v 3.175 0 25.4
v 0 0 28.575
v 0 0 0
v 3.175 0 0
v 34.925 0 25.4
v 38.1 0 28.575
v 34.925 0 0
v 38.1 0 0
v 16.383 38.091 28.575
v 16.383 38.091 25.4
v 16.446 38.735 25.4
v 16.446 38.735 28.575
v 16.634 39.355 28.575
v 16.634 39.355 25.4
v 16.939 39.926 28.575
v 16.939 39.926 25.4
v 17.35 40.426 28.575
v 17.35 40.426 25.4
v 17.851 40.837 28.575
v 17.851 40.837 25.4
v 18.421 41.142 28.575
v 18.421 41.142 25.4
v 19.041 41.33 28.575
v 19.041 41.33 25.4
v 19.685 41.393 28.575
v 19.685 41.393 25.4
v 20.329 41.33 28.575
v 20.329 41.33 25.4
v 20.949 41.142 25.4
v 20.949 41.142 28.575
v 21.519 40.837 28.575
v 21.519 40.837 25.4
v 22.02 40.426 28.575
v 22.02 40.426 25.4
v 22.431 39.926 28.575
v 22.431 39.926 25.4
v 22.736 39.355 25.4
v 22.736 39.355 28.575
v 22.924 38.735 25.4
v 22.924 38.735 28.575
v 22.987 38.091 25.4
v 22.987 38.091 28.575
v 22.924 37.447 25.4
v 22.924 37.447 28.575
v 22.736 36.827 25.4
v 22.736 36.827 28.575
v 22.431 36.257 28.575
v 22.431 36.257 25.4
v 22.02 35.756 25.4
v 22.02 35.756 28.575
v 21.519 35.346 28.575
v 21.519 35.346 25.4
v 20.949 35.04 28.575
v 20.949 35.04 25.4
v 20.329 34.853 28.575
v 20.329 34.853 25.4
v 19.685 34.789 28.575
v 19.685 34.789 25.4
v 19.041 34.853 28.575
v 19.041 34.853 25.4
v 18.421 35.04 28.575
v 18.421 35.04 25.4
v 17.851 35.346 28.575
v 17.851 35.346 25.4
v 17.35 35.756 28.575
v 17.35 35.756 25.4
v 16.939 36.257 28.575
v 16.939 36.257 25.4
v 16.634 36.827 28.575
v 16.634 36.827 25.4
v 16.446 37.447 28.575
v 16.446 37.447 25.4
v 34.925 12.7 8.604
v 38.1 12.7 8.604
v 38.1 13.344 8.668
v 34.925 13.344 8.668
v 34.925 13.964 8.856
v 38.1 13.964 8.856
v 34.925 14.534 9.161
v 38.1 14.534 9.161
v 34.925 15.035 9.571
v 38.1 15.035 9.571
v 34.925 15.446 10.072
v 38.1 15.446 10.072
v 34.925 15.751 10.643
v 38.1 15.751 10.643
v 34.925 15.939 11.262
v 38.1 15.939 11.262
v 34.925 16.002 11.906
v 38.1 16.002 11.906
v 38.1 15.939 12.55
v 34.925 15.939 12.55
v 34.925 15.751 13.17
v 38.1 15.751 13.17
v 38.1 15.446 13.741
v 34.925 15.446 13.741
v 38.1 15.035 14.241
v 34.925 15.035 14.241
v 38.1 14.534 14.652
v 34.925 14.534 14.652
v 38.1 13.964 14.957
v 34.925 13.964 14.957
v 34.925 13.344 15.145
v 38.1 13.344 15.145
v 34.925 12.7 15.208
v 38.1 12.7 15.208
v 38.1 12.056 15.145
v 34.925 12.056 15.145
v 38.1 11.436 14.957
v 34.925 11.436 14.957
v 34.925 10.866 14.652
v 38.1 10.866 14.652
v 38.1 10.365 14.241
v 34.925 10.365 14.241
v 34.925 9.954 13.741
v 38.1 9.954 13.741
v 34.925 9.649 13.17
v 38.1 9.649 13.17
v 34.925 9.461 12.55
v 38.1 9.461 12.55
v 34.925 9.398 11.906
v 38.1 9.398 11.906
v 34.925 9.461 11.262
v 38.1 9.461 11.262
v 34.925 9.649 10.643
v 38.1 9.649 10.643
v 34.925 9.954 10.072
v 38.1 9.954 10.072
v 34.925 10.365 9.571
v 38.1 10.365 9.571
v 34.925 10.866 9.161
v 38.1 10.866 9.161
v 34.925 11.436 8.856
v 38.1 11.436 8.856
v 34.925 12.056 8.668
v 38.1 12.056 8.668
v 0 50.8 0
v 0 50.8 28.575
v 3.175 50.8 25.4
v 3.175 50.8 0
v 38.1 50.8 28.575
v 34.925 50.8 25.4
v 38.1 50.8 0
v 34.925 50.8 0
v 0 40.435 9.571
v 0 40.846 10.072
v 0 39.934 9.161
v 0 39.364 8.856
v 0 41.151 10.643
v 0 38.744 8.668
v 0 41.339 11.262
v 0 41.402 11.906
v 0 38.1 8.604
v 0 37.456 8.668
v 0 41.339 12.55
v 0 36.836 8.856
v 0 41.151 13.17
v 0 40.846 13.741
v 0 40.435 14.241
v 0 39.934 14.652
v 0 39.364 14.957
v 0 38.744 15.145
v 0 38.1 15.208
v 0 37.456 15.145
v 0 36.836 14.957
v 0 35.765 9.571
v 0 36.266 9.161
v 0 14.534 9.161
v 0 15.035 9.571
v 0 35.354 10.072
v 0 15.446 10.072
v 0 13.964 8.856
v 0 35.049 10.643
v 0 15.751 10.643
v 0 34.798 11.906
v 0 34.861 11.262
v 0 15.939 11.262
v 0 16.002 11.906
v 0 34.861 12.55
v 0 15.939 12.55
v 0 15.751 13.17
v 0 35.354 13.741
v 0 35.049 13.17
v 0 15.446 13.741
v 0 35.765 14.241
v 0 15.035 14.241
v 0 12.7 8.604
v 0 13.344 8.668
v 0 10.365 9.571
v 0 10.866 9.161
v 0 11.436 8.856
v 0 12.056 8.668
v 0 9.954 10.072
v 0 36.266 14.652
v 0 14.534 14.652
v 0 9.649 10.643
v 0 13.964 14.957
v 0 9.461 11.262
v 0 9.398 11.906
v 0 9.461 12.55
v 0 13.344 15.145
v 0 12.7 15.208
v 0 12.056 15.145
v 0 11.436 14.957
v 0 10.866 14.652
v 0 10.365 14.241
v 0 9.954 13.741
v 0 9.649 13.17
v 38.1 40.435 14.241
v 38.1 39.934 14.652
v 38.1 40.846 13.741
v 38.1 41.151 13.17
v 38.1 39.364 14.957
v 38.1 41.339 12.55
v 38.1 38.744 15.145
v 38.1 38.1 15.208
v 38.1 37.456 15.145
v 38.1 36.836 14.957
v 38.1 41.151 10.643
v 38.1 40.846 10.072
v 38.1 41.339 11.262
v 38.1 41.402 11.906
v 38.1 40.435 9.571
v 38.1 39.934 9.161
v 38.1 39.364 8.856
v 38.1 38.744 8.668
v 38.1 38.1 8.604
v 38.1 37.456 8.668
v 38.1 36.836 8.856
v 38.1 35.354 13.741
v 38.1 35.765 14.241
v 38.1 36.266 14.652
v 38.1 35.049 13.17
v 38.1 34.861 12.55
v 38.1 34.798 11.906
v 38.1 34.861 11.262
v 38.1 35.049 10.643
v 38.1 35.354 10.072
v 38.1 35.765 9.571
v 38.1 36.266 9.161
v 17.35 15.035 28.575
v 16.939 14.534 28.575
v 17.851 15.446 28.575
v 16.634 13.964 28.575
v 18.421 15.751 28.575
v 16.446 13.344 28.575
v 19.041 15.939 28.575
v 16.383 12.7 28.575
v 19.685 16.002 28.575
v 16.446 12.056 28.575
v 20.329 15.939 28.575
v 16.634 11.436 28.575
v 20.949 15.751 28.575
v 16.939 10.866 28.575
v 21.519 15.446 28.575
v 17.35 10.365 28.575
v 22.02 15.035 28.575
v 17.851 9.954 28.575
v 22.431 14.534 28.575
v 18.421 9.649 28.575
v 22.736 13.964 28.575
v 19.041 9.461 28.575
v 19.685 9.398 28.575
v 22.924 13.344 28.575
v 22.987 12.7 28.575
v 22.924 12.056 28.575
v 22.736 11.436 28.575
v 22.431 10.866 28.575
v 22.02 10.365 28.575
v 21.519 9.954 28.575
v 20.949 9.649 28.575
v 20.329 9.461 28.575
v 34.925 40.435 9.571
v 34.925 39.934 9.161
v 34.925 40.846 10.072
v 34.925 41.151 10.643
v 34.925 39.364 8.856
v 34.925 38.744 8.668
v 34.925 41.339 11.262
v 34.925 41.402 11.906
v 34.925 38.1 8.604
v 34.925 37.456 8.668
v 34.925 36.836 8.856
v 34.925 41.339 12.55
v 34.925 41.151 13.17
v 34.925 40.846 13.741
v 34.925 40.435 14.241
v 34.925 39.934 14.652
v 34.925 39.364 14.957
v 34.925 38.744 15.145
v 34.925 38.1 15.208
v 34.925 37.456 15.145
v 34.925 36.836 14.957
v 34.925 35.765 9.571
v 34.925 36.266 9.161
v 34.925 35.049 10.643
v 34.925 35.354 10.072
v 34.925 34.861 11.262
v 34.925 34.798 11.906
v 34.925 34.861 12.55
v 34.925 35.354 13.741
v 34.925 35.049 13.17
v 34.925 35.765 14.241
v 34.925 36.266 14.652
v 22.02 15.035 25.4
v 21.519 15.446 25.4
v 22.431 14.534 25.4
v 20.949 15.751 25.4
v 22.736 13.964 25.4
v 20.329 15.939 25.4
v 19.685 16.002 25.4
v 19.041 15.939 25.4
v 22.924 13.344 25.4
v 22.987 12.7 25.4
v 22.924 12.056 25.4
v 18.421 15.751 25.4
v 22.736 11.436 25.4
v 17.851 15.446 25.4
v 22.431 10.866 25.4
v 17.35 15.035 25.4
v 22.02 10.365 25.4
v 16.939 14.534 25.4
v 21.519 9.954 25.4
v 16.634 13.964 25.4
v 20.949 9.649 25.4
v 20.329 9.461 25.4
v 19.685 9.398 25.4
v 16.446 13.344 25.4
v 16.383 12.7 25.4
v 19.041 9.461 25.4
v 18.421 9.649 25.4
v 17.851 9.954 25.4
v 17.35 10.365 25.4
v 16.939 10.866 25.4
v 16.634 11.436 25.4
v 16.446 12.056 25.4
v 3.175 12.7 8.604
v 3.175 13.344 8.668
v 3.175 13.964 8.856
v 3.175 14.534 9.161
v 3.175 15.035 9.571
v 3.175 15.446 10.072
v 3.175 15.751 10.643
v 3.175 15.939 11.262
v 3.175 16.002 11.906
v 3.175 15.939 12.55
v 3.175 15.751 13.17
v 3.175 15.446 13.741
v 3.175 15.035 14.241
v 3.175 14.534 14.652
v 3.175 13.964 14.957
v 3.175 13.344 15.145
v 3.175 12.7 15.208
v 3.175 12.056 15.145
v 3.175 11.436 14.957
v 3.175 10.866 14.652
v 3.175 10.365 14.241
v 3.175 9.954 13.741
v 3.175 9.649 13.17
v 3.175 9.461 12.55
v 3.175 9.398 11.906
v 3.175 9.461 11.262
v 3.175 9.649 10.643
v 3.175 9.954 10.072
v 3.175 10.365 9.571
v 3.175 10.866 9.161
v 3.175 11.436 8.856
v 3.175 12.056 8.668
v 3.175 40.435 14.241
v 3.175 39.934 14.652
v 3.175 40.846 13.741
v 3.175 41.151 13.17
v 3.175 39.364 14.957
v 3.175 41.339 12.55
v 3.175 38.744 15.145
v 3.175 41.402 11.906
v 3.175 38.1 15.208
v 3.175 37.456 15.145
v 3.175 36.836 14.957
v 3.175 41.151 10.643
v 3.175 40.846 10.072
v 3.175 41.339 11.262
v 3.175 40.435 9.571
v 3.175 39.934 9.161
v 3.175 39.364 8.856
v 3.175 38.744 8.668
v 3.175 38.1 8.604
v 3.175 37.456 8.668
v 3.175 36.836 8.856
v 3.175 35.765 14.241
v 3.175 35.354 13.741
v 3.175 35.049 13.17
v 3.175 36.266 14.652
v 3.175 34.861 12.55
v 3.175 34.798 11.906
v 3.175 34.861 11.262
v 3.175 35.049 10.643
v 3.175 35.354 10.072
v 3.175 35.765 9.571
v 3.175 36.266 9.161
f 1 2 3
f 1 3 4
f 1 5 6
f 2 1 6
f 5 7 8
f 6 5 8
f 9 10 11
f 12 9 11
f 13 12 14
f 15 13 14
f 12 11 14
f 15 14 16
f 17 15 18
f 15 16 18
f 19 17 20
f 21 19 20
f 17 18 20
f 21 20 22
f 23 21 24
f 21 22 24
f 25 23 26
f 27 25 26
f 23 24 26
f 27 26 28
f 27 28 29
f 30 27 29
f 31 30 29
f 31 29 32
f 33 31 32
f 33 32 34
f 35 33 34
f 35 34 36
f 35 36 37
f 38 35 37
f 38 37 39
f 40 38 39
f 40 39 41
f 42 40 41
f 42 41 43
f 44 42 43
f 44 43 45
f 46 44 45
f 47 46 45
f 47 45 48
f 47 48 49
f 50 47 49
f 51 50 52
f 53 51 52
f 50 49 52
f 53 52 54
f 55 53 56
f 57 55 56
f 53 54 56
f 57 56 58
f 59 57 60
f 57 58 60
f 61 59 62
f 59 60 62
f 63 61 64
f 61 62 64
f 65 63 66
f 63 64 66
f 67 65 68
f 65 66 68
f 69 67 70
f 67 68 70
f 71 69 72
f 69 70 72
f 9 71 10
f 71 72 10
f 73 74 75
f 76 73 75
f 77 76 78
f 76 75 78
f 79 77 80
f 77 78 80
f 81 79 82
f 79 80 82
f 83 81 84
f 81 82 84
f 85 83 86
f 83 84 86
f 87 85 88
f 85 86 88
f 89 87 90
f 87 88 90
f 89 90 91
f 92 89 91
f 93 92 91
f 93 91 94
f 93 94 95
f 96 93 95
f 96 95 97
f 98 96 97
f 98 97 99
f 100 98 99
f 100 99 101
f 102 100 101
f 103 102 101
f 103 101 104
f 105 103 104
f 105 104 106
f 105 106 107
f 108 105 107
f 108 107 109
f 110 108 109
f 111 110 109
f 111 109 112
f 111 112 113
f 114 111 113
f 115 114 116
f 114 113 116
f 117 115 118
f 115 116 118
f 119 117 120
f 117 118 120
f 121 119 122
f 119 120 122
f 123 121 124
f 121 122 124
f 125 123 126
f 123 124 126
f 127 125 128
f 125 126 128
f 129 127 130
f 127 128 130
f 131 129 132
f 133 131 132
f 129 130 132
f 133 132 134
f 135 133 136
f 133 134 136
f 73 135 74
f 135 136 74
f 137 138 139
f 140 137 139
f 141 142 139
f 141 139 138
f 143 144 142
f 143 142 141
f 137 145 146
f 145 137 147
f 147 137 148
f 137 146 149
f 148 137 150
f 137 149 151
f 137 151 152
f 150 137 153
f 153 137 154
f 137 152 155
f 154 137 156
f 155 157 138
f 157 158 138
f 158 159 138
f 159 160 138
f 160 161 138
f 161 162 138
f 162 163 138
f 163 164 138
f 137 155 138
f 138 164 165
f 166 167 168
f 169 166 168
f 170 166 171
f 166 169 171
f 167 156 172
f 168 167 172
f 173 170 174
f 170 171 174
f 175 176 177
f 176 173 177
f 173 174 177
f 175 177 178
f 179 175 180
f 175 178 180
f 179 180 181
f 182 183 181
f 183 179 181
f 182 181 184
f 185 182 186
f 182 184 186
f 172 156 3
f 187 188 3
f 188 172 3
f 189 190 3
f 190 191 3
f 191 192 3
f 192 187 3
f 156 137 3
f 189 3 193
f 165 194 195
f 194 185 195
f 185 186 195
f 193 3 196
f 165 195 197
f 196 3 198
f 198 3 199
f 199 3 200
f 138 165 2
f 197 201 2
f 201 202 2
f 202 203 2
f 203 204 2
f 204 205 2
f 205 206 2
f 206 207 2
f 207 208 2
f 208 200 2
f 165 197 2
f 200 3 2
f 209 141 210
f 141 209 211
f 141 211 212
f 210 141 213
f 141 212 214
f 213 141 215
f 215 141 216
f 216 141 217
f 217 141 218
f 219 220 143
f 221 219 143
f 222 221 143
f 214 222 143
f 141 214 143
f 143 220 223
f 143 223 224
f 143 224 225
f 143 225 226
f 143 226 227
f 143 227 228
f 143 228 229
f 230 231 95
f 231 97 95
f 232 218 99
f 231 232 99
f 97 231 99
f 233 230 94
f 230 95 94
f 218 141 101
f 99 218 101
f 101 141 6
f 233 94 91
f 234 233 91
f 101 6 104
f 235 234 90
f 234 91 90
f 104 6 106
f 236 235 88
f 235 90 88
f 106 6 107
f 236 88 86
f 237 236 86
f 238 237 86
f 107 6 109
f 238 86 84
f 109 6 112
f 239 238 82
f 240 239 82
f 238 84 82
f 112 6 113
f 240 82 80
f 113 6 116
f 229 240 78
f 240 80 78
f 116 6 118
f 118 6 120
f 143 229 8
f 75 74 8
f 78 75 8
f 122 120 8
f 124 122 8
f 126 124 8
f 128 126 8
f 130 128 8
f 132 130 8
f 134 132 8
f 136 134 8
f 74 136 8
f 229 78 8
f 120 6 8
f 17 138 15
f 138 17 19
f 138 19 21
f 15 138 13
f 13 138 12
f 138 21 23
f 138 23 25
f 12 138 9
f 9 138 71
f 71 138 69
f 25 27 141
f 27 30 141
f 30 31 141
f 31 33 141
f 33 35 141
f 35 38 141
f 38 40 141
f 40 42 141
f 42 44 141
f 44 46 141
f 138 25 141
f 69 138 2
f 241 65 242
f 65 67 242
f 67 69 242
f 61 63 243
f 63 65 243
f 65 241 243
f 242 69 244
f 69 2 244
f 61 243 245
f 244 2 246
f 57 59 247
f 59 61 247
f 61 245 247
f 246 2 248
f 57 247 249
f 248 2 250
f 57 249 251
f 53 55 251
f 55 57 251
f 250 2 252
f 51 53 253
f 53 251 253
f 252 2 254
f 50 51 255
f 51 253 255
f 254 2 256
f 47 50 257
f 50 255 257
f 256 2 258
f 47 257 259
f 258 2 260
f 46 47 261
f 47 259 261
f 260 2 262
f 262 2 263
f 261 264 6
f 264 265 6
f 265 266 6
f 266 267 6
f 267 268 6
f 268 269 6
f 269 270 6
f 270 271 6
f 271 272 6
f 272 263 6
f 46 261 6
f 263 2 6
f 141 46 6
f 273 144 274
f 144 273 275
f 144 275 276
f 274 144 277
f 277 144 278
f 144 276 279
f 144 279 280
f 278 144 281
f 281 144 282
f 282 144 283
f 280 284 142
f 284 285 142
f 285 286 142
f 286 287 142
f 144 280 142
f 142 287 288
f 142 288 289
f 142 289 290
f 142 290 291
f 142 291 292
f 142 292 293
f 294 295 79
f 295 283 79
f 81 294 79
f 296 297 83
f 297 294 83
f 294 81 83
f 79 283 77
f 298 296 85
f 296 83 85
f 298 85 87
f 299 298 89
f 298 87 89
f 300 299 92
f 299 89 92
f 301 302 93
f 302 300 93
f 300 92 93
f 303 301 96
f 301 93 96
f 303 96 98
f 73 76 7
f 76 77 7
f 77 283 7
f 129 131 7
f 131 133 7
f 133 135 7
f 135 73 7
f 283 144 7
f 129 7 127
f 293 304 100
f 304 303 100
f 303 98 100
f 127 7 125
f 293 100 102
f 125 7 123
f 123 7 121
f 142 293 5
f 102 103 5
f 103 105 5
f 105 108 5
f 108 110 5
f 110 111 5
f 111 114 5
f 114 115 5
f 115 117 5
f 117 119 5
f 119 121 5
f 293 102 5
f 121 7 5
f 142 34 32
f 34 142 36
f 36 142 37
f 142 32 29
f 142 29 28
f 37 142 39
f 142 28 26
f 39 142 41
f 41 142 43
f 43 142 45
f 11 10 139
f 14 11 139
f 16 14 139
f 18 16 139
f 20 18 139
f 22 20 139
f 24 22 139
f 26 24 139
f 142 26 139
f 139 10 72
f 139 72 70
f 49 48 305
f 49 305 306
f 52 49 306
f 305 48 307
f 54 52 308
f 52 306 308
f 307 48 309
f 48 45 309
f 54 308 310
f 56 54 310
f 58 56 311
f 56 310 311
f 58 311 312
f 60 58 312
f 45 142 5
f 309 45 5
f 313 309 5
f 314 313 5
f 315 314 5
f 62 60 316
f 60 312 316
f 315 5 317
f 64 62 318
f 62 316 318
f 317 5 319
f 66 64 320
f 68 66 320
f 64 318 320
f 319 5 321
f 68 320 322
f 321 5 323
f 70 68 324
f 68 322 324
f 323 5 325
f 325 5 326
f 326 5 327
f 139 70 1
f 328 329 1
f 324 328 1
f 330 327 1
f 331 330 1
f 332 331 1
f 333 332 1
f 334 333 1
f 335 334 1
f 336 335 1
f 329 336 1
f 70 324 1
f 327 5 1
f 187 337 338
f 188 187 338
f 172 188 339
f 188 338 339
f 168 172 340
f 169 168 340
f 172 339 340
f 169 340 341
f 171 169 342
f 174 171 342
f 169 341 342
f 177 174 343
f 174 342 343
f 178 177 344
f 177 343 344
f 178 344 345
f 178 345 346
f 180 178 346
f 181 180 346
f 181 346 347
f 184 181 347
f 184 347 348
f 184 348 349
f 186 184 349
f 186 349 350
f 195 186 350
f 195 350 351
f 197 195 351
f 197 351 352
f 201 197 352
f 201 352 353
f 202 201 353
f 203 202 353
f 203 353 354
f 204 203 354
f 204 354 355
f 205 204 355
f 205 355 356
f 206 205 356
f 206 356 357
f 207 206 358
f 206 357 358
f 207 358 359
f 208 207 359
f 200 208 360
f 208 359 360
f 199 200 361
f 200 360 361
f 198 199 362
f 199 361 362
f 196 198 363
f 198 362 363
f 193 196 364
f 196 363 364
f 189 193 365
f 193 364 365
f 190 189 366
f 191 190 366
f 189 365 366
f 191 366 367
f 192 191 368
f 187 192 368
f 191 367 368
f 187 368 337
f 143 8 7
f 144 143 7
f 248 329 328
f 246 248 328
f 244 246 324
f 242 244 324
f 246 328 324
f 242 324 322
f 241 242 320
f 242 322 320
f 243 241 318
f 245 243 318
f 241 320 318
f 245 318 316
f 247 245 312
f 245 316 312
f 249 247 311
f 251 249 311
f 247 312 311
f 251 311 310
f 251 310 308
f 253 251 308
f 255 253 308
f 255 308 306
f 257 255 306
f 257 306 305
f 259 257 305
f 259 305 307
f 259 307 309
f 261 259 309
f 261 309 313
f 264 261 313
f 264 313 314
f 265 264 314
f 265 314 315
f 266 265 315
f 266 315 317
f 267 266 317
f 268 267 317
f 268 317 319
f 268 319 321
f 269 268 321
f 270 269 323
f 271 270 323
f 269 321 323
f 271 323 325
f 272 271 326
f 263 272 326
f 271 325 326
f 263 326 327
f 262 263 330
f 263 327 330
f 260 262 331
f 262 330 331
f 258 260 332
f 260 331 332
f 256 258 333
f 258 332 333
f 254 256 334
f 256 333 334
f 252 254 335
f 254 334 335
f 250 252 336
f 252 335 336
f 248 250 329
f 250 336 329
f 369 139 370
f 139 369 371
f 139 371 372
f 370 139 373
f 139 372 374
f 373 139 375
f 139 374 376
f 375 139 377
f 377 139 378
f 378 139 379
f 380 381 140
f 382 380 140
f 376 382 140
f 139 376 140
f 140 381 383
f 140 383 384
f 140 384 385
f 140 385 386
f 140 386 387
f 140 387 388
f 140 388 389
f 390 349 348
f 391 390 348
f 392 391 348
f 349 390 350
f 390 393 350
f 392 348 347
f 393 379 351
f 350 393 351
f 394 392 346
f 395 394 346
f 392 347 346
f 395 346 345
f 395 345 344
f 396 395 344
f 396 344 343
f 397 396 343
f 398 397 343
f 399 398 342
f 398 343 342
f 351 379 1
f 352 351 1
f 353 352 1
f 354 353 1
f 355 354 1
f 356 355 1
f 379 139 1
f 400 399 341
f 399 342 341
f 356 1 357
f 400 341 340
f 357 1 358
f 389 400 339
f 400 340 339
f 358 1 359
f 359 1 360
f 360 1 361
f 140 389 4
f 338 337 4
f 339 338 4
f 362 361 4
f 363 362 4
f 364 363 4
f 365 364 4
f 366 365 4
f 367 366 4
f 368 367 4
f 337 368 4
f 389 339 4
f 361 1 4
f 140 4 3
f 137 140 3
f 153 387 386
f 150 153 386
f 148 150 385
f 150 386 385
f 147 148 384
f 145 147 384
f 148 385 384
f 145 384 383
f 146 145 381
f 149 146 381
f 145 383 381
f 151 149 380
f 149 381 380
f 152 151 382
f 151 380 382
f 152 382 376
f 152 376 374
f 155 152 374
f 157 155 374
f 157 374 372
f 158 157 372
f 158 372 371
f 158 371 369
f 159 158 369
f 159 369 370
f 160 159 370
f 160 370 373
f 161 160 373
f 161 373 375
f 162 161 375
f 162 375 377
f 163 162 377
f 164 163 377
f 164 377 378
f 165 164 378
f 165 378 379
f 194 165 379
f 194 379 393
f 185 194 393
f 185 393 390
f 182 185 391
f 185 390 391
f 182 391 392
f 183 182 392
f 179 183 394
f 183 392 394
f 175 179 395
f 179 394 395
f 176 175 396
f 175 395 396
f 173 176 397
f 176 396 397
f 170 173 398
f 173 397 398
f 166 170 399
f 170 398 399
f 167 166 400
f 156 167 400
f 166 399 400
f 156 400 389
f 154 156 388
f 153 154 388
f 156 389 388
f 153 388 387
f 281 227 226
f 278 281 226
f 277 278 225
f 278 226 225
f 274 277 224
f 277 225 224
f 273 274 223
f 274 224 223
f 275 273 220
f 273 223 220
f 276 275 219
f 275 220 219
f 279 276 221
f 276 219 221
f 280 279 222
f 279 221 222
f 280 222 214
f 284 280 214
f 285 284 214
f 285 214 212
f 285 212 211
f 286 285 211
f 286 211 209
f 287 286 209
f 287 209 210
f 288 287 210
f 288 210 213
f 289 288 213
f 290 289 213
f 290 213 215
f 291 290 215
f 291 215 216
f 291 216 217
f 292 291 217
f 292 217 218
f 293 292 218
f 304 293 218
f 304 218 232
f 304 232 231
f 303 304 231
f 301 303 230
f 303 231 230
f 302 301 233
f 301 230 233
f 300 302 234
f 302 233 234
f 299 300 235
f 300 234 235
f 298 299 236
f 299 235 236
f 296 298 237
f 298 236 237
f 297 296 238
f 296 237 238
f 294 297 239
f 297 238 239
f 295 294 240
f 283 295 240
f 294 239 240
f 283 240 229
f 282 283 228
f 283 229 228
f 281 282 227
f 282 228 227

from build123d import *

# Parameters (mm, degrees)
BOSS_EXTRUDE1_DEPTH = 50.8
SKETCH3_R           = 3.302
CUT_EXTRUDE1_DEPTH  = 50.8
SKETCH4_R           = 3.302
CUT_EXTRUDE2_DEPTH  = 70.633186233


with BuildPart() as part:
    # Sketch2 → Boss-Extrude1 (new body)
    with BuildSketch(Plane(origin=(0, 0, 0), x_dir=(1, 0, 0), z_dir=(0, 1, 0))):
        Polygon((0, 0), (0, -28.575), (38.1, -28.575), (38.1, 0), (34.925, 0), (34.925, -25.4), (3.175, -25.4), (3.175, 0), align=None)
    extrude(amount=BOSS_EXTRUDE1_DEPTH)

    # Sketch3 → Cut-Extrude1 (cut)
    with BuildSketch(Plane(origin=(0, 0, 25.4), x_dir=(-1, 0, 0), z_dir=(0, 0, -1))):
        with Locations((-19.685, 12.7)):
            Circle(SKETCH3_R)
        with Locations((-19.685, 38.091107032)):
            Circle(SKETCH3_R)
    extrude(amount=-CUT_EXTRUDE1_DEPTH, mode=Mode.SUBTRACT)

    # Sketch4 → Cut-Extrude2 (cut, through all)
    with BuildSketch(Plane(origin=(38.1, 0, 0), x_dir=(0, 0, -1), z_dir=(1, 0, 0))):
        with Locations((-11.90625, 38.1)):
            Circle(SKETCH4_R)
        with Locations((-11.90625, 12.7)):
            Circle(SKETCH4_R)
    extrude(amount=-CUT_EXTRUDE2_DEPTH, mode=Mode.SUBTRACT)


solid = part.part
